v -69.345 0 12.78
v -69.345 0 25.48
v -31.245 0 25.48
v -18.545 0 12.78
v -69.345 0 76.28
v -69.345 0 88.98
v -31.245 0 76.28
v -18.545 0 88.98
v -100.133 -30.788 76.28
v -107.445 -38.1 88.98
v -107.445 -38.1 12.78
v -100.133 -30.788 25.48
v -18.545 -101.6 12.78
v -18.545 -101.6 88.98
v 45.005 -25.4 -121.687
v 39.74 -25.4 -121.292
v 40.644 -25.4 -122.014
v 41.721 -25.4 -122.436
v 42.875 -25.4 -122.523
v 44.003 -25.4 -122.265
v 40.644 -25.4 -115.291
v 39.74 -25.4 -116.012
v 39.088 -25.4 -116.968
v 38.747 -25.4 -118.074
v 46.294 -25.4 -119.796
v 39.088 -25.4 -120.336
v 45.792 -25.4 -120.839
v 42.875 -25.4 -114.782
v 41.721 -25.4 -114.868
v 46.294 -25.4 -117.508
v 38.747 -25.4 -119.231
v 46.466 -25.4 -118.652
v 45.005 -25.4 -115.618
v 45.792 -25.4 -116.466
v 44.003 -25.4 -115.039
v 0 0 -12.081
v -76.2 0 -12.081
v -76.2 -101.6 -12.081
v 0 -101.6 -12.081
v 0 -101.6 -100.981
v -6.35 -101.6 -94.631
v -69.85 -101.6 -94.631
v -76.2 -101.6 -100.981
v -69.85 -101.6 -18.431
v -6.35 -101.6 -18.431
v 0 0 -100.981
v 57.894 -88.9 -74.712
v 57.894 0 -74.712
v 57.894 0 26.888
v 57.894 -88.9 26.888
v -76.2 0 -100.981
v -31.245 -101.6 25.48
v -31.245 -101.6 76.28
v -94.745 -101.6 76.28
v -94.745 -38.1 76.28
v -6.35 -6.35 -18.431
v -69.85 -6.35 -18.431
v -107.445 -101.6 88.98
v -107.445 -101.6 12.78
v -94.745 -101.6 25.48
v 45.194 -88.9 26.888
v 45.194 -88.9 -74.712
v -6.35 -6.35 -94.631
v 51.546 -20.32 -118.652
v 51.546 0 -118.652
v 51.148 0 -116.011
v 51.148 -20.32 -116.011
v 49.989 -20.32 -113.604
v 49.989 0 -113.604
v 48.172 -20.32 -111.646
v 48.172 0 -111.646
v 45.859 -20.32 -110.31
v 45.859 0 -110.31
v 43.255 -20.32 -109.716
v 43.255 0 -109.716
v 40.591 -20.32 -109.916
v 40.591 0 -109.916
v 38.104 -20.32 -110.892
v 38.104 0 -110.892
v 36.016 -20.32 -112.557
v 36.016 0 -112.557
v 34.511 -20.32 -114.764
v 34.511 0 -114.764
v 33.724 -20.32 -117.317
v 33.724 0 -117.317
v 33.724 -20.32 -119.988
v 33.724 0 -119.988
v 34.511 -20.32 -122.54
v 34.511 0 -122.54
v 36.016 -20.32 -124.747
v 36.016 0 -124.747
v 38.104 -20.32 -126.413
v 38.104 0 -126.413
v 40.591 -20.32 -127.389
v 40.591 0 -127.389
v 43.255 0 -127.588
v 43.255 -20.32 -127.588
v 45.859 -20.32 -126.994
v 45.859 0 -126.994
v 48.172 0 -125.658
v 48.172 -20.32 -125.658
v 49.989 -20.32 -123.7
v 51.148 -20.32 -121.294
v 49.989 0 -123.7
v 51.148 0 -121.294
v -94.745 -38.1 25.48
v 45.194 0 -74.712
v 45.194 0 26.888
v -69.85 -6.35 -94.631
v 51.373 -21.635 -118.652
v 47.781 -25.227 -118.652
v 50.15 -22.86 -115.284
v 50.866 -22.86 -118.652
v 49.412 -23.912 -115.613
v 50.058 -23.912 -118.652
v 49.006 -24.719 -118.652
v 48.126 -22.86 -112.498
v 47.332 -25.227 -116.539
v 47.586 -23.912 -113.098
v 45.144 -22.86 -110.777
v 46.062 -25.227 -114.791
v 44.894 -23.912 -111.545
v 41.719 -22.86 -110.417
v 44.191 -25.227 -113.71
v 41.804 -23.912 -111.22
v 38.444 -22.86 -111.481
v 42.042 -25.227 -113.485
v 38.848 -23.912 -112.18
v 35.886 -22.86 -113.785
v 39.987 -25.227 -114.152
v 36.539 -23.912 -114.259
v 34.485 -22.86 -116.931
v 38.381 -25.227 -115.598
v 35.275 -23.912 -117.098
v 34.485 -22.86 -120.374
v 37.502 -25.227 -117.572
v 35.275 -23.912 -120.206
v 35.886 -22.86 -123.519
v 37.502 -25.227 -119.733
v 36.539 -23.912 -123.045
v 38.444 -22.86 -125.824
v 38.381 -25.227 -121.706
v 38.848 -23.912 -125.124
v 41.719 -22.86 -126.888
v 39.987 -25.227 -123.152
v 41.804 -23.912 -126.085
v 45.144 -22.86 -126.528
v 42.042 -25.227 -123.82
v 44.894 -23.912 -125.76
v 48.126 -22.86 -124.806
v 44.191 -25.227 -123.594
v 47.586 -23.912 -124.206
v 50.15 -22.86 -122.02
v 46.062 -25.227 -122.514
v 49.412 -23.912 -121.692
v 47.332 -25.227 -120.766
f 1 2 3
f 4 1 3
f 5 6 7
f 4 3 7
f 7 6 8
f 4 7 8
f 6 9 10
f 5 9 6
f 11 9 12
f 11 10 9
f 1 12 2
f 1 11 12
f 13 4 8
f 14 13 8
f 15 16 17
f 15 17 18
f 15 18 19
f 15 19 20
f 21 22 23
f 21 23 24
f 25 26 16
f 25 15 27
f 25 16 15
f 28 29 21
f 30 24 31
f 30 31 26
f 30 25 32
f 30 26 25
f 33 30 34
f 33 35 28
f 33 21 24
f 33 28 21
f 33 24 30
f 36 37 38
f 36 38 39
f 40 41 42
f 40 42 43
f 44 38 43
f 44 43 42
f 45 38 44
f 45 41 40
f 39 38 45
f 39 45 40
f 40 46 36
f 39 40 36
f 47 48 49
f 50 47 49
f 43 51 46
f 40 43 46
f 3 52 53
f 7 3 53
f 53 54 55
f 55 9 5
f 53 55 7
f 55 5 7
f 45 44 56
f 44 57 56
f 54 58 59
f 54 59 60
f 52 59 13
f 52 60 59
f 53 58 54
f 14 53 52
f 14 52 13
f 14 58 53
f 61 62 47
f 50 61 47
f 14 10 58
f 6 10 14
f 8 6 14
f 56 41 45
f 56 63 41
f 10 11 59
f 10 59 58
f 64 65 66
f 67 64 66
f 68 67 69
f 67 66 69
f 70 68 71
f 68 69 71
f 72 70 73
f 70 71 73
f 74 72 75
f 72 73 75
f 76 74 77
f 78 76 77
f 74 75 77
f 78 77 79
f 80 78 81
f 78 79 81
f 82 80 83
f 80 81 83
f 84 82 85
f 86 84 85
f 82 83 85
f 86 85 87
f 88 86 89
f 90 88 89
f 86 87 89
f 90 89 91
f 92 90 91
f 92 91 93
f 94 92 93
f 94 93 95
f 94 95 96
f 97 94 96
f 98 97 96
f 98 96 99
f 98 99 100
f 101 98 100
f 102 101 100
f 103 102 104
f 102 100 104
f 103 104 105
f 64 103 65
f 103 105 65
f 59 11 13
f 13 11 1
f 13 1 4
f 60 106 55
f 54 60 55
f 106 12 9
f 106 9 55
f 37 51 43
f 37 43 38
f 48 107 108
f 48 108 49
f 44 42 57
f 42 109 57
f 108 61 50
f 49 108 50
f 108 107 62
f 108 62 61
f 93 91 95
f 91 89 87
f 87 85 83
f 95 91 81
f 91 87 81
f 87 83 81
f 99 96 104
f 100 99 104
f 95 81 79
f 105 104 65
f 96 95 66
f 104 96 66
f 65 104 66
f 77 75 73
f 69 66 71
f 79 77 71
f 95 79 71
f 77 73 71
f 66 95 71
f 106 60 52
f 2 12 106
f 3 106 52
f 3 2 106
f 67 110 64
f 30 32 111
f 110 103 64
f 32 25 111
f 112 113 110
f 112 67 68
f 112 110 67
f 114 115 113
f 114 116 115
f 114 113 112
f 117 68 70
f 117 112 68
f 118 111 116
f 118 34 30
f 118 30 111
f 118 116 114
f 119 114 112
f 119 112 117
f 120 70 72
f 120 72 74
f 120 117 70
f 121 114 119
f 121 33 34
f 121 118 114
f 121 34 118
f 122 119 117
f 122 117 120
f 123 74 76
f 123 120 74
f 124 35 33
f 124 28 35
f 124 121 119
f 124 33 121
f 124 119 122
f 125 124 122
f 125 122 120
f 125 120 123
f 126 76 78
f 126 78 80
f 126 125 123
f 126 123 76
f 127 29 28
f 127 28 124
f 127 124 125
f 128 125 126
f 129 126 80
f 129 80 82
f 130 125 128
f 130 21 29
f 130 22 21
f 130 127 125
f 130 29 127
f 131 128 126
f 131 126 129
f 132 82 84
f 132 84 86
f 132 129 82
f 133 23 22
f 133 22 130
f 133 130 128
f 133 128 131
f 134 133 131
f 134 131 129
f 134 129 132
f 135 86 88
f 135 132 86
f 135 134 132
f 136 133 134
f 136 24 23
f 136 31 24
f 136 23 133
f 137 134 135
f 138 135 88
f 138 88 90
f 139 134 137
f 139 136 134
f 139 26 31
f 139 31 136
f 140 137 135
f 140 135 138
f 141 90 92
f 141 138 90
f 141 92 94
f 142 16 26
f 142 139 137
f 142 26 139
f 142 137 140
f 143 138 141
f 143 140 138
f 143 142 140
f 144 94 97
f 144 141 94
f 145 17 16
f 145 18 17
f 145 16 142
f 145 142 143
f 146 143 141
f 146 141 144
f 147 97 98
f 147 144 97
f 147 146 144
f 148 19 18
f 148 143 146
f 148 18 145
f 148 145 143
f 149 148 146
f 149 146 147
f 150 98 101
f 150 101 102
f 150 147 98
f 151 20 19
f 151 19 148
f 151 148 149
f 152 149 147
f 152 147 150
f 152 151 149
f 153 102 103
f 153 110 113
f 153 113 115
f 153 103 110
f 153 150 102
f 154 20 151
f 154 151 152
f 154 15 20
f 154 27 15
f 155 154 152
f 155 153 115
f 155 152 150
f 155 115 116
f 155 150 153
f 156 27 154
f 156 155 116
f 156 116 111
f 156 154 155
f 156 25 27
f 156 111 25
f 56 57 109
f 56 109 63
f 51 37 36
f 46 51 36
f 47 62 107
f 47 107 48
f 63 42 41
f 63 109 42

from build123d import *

# Parameters (mm, degrees)
F0_W        = 12.7
F0_H        = 101.6
F1_DEPTH    = 88.9
F0_W_2      = 88.9
F0_H_2      = 76.2
F0_W_3      = 63.5
F0_H_3      = 50.8
F2_DEPTH    = 101.6
F3_T1_DEPTH = 272.162243683
F4_T1_DEPTH = 50.8
F5_W        = 76.2
F5_H        = 88.9
F6_DEPTH    = 101.6
F7_T        = -6.35
F8_R        = 8.961281468
F9_DEPTH    = 25.4
F10_R       = 5.08


# Not quite as in the source:
# - a fillet or chamfer that OpenCascade refuses, or shapes differently, is made with other operations: its cross-section is extruded or revolved along the edge and cut away or added


with BuildPart() as f1:
    # F0 (on Front) → F1 (new body)
    with BuildSketch(Plane.XZ):
        with Locations((51.5435934067, -23.9115703218)):
            Rectangle(F0_W, F0_H)
    extrude(amount=F1_DEPTH)


with BuildPart() as f2:
    # F0 (on Front) → F2 (new body)
    with BuildSketch(Plane.XZ):
        with Locations((-62.9948227882, 50.8801213741)):
            Rectangle(F0_W_2, F0_H_2)
        with Locations((-62.9948227882, 50.8801213741)):
            Rectangle(F0_W_3, F0_H_3, mode=Mode.SUBTRACT)
    extrude(amount=F2_DEPTH)

    # F3: chamfer of 38.1 on 1 edges, made by hand

    # F3_s2 → F3_t1 (cut)
    with BuildSketch(Plane.XY.offset(-85.2010004674)):
        Polygon((-107.4448227882, -38.1), (-69.3448227882, 0), (-107.4448227882, 0), align=None)
    extrude(amount=F3_T1_DEPTH, mode=Mode.SUBTRACT)

    # F4: chamfer of 12.7 x 7.62 on 1 edges, made by hand

    # F4_s2 → F4_t1 (cut)
    with BuildSketch(Plane.XY.offset(25.4801213741)):
        Polygon((-100.1329764609, -30.7881536727), (-94.7448227882, -38.1), (-94.7448227882, -25.4), align=None)
    extrude(amount=F4_T1_DEPTH, mode=Mode.SUBTRACT)


with BuildPart() as f6:
    # F5 (on Front) → F6 (new body)
    with BuildSketch(Plane.XZ):
        with Locations((-38.1, -56.5309760347)):
            Rectangle(F5_W, F5_H)
    extrude(amount=F6_DEPTH)

    # F7
    f7_openings = [f6.faces().sort_by_distance(p)[0] for p in [
        (-38.1, -101.6, -56.530976),
    ]]
    offset(amount=F7_T, openings=f7_openings)


with BuildPart() as f9:
    # F8 (on Front) → F9 (new body)
    with BuildSketch(Plane.XZ):
        with Locations((42.5848402083, -118.6522245407)):
            Circle(F8_R)
    extrude(amount=F9_DEPTH)

    # F10
    f10_edges = [f9.edges().sort_by_distance(p)[0] for p in [
        (33.623559, -25.4, -118.652225),
    ]]
    fillet(f10_edges, radius=F10_R)


solid = Compound([f1.part, f2.part, f6.part, f9.part])
